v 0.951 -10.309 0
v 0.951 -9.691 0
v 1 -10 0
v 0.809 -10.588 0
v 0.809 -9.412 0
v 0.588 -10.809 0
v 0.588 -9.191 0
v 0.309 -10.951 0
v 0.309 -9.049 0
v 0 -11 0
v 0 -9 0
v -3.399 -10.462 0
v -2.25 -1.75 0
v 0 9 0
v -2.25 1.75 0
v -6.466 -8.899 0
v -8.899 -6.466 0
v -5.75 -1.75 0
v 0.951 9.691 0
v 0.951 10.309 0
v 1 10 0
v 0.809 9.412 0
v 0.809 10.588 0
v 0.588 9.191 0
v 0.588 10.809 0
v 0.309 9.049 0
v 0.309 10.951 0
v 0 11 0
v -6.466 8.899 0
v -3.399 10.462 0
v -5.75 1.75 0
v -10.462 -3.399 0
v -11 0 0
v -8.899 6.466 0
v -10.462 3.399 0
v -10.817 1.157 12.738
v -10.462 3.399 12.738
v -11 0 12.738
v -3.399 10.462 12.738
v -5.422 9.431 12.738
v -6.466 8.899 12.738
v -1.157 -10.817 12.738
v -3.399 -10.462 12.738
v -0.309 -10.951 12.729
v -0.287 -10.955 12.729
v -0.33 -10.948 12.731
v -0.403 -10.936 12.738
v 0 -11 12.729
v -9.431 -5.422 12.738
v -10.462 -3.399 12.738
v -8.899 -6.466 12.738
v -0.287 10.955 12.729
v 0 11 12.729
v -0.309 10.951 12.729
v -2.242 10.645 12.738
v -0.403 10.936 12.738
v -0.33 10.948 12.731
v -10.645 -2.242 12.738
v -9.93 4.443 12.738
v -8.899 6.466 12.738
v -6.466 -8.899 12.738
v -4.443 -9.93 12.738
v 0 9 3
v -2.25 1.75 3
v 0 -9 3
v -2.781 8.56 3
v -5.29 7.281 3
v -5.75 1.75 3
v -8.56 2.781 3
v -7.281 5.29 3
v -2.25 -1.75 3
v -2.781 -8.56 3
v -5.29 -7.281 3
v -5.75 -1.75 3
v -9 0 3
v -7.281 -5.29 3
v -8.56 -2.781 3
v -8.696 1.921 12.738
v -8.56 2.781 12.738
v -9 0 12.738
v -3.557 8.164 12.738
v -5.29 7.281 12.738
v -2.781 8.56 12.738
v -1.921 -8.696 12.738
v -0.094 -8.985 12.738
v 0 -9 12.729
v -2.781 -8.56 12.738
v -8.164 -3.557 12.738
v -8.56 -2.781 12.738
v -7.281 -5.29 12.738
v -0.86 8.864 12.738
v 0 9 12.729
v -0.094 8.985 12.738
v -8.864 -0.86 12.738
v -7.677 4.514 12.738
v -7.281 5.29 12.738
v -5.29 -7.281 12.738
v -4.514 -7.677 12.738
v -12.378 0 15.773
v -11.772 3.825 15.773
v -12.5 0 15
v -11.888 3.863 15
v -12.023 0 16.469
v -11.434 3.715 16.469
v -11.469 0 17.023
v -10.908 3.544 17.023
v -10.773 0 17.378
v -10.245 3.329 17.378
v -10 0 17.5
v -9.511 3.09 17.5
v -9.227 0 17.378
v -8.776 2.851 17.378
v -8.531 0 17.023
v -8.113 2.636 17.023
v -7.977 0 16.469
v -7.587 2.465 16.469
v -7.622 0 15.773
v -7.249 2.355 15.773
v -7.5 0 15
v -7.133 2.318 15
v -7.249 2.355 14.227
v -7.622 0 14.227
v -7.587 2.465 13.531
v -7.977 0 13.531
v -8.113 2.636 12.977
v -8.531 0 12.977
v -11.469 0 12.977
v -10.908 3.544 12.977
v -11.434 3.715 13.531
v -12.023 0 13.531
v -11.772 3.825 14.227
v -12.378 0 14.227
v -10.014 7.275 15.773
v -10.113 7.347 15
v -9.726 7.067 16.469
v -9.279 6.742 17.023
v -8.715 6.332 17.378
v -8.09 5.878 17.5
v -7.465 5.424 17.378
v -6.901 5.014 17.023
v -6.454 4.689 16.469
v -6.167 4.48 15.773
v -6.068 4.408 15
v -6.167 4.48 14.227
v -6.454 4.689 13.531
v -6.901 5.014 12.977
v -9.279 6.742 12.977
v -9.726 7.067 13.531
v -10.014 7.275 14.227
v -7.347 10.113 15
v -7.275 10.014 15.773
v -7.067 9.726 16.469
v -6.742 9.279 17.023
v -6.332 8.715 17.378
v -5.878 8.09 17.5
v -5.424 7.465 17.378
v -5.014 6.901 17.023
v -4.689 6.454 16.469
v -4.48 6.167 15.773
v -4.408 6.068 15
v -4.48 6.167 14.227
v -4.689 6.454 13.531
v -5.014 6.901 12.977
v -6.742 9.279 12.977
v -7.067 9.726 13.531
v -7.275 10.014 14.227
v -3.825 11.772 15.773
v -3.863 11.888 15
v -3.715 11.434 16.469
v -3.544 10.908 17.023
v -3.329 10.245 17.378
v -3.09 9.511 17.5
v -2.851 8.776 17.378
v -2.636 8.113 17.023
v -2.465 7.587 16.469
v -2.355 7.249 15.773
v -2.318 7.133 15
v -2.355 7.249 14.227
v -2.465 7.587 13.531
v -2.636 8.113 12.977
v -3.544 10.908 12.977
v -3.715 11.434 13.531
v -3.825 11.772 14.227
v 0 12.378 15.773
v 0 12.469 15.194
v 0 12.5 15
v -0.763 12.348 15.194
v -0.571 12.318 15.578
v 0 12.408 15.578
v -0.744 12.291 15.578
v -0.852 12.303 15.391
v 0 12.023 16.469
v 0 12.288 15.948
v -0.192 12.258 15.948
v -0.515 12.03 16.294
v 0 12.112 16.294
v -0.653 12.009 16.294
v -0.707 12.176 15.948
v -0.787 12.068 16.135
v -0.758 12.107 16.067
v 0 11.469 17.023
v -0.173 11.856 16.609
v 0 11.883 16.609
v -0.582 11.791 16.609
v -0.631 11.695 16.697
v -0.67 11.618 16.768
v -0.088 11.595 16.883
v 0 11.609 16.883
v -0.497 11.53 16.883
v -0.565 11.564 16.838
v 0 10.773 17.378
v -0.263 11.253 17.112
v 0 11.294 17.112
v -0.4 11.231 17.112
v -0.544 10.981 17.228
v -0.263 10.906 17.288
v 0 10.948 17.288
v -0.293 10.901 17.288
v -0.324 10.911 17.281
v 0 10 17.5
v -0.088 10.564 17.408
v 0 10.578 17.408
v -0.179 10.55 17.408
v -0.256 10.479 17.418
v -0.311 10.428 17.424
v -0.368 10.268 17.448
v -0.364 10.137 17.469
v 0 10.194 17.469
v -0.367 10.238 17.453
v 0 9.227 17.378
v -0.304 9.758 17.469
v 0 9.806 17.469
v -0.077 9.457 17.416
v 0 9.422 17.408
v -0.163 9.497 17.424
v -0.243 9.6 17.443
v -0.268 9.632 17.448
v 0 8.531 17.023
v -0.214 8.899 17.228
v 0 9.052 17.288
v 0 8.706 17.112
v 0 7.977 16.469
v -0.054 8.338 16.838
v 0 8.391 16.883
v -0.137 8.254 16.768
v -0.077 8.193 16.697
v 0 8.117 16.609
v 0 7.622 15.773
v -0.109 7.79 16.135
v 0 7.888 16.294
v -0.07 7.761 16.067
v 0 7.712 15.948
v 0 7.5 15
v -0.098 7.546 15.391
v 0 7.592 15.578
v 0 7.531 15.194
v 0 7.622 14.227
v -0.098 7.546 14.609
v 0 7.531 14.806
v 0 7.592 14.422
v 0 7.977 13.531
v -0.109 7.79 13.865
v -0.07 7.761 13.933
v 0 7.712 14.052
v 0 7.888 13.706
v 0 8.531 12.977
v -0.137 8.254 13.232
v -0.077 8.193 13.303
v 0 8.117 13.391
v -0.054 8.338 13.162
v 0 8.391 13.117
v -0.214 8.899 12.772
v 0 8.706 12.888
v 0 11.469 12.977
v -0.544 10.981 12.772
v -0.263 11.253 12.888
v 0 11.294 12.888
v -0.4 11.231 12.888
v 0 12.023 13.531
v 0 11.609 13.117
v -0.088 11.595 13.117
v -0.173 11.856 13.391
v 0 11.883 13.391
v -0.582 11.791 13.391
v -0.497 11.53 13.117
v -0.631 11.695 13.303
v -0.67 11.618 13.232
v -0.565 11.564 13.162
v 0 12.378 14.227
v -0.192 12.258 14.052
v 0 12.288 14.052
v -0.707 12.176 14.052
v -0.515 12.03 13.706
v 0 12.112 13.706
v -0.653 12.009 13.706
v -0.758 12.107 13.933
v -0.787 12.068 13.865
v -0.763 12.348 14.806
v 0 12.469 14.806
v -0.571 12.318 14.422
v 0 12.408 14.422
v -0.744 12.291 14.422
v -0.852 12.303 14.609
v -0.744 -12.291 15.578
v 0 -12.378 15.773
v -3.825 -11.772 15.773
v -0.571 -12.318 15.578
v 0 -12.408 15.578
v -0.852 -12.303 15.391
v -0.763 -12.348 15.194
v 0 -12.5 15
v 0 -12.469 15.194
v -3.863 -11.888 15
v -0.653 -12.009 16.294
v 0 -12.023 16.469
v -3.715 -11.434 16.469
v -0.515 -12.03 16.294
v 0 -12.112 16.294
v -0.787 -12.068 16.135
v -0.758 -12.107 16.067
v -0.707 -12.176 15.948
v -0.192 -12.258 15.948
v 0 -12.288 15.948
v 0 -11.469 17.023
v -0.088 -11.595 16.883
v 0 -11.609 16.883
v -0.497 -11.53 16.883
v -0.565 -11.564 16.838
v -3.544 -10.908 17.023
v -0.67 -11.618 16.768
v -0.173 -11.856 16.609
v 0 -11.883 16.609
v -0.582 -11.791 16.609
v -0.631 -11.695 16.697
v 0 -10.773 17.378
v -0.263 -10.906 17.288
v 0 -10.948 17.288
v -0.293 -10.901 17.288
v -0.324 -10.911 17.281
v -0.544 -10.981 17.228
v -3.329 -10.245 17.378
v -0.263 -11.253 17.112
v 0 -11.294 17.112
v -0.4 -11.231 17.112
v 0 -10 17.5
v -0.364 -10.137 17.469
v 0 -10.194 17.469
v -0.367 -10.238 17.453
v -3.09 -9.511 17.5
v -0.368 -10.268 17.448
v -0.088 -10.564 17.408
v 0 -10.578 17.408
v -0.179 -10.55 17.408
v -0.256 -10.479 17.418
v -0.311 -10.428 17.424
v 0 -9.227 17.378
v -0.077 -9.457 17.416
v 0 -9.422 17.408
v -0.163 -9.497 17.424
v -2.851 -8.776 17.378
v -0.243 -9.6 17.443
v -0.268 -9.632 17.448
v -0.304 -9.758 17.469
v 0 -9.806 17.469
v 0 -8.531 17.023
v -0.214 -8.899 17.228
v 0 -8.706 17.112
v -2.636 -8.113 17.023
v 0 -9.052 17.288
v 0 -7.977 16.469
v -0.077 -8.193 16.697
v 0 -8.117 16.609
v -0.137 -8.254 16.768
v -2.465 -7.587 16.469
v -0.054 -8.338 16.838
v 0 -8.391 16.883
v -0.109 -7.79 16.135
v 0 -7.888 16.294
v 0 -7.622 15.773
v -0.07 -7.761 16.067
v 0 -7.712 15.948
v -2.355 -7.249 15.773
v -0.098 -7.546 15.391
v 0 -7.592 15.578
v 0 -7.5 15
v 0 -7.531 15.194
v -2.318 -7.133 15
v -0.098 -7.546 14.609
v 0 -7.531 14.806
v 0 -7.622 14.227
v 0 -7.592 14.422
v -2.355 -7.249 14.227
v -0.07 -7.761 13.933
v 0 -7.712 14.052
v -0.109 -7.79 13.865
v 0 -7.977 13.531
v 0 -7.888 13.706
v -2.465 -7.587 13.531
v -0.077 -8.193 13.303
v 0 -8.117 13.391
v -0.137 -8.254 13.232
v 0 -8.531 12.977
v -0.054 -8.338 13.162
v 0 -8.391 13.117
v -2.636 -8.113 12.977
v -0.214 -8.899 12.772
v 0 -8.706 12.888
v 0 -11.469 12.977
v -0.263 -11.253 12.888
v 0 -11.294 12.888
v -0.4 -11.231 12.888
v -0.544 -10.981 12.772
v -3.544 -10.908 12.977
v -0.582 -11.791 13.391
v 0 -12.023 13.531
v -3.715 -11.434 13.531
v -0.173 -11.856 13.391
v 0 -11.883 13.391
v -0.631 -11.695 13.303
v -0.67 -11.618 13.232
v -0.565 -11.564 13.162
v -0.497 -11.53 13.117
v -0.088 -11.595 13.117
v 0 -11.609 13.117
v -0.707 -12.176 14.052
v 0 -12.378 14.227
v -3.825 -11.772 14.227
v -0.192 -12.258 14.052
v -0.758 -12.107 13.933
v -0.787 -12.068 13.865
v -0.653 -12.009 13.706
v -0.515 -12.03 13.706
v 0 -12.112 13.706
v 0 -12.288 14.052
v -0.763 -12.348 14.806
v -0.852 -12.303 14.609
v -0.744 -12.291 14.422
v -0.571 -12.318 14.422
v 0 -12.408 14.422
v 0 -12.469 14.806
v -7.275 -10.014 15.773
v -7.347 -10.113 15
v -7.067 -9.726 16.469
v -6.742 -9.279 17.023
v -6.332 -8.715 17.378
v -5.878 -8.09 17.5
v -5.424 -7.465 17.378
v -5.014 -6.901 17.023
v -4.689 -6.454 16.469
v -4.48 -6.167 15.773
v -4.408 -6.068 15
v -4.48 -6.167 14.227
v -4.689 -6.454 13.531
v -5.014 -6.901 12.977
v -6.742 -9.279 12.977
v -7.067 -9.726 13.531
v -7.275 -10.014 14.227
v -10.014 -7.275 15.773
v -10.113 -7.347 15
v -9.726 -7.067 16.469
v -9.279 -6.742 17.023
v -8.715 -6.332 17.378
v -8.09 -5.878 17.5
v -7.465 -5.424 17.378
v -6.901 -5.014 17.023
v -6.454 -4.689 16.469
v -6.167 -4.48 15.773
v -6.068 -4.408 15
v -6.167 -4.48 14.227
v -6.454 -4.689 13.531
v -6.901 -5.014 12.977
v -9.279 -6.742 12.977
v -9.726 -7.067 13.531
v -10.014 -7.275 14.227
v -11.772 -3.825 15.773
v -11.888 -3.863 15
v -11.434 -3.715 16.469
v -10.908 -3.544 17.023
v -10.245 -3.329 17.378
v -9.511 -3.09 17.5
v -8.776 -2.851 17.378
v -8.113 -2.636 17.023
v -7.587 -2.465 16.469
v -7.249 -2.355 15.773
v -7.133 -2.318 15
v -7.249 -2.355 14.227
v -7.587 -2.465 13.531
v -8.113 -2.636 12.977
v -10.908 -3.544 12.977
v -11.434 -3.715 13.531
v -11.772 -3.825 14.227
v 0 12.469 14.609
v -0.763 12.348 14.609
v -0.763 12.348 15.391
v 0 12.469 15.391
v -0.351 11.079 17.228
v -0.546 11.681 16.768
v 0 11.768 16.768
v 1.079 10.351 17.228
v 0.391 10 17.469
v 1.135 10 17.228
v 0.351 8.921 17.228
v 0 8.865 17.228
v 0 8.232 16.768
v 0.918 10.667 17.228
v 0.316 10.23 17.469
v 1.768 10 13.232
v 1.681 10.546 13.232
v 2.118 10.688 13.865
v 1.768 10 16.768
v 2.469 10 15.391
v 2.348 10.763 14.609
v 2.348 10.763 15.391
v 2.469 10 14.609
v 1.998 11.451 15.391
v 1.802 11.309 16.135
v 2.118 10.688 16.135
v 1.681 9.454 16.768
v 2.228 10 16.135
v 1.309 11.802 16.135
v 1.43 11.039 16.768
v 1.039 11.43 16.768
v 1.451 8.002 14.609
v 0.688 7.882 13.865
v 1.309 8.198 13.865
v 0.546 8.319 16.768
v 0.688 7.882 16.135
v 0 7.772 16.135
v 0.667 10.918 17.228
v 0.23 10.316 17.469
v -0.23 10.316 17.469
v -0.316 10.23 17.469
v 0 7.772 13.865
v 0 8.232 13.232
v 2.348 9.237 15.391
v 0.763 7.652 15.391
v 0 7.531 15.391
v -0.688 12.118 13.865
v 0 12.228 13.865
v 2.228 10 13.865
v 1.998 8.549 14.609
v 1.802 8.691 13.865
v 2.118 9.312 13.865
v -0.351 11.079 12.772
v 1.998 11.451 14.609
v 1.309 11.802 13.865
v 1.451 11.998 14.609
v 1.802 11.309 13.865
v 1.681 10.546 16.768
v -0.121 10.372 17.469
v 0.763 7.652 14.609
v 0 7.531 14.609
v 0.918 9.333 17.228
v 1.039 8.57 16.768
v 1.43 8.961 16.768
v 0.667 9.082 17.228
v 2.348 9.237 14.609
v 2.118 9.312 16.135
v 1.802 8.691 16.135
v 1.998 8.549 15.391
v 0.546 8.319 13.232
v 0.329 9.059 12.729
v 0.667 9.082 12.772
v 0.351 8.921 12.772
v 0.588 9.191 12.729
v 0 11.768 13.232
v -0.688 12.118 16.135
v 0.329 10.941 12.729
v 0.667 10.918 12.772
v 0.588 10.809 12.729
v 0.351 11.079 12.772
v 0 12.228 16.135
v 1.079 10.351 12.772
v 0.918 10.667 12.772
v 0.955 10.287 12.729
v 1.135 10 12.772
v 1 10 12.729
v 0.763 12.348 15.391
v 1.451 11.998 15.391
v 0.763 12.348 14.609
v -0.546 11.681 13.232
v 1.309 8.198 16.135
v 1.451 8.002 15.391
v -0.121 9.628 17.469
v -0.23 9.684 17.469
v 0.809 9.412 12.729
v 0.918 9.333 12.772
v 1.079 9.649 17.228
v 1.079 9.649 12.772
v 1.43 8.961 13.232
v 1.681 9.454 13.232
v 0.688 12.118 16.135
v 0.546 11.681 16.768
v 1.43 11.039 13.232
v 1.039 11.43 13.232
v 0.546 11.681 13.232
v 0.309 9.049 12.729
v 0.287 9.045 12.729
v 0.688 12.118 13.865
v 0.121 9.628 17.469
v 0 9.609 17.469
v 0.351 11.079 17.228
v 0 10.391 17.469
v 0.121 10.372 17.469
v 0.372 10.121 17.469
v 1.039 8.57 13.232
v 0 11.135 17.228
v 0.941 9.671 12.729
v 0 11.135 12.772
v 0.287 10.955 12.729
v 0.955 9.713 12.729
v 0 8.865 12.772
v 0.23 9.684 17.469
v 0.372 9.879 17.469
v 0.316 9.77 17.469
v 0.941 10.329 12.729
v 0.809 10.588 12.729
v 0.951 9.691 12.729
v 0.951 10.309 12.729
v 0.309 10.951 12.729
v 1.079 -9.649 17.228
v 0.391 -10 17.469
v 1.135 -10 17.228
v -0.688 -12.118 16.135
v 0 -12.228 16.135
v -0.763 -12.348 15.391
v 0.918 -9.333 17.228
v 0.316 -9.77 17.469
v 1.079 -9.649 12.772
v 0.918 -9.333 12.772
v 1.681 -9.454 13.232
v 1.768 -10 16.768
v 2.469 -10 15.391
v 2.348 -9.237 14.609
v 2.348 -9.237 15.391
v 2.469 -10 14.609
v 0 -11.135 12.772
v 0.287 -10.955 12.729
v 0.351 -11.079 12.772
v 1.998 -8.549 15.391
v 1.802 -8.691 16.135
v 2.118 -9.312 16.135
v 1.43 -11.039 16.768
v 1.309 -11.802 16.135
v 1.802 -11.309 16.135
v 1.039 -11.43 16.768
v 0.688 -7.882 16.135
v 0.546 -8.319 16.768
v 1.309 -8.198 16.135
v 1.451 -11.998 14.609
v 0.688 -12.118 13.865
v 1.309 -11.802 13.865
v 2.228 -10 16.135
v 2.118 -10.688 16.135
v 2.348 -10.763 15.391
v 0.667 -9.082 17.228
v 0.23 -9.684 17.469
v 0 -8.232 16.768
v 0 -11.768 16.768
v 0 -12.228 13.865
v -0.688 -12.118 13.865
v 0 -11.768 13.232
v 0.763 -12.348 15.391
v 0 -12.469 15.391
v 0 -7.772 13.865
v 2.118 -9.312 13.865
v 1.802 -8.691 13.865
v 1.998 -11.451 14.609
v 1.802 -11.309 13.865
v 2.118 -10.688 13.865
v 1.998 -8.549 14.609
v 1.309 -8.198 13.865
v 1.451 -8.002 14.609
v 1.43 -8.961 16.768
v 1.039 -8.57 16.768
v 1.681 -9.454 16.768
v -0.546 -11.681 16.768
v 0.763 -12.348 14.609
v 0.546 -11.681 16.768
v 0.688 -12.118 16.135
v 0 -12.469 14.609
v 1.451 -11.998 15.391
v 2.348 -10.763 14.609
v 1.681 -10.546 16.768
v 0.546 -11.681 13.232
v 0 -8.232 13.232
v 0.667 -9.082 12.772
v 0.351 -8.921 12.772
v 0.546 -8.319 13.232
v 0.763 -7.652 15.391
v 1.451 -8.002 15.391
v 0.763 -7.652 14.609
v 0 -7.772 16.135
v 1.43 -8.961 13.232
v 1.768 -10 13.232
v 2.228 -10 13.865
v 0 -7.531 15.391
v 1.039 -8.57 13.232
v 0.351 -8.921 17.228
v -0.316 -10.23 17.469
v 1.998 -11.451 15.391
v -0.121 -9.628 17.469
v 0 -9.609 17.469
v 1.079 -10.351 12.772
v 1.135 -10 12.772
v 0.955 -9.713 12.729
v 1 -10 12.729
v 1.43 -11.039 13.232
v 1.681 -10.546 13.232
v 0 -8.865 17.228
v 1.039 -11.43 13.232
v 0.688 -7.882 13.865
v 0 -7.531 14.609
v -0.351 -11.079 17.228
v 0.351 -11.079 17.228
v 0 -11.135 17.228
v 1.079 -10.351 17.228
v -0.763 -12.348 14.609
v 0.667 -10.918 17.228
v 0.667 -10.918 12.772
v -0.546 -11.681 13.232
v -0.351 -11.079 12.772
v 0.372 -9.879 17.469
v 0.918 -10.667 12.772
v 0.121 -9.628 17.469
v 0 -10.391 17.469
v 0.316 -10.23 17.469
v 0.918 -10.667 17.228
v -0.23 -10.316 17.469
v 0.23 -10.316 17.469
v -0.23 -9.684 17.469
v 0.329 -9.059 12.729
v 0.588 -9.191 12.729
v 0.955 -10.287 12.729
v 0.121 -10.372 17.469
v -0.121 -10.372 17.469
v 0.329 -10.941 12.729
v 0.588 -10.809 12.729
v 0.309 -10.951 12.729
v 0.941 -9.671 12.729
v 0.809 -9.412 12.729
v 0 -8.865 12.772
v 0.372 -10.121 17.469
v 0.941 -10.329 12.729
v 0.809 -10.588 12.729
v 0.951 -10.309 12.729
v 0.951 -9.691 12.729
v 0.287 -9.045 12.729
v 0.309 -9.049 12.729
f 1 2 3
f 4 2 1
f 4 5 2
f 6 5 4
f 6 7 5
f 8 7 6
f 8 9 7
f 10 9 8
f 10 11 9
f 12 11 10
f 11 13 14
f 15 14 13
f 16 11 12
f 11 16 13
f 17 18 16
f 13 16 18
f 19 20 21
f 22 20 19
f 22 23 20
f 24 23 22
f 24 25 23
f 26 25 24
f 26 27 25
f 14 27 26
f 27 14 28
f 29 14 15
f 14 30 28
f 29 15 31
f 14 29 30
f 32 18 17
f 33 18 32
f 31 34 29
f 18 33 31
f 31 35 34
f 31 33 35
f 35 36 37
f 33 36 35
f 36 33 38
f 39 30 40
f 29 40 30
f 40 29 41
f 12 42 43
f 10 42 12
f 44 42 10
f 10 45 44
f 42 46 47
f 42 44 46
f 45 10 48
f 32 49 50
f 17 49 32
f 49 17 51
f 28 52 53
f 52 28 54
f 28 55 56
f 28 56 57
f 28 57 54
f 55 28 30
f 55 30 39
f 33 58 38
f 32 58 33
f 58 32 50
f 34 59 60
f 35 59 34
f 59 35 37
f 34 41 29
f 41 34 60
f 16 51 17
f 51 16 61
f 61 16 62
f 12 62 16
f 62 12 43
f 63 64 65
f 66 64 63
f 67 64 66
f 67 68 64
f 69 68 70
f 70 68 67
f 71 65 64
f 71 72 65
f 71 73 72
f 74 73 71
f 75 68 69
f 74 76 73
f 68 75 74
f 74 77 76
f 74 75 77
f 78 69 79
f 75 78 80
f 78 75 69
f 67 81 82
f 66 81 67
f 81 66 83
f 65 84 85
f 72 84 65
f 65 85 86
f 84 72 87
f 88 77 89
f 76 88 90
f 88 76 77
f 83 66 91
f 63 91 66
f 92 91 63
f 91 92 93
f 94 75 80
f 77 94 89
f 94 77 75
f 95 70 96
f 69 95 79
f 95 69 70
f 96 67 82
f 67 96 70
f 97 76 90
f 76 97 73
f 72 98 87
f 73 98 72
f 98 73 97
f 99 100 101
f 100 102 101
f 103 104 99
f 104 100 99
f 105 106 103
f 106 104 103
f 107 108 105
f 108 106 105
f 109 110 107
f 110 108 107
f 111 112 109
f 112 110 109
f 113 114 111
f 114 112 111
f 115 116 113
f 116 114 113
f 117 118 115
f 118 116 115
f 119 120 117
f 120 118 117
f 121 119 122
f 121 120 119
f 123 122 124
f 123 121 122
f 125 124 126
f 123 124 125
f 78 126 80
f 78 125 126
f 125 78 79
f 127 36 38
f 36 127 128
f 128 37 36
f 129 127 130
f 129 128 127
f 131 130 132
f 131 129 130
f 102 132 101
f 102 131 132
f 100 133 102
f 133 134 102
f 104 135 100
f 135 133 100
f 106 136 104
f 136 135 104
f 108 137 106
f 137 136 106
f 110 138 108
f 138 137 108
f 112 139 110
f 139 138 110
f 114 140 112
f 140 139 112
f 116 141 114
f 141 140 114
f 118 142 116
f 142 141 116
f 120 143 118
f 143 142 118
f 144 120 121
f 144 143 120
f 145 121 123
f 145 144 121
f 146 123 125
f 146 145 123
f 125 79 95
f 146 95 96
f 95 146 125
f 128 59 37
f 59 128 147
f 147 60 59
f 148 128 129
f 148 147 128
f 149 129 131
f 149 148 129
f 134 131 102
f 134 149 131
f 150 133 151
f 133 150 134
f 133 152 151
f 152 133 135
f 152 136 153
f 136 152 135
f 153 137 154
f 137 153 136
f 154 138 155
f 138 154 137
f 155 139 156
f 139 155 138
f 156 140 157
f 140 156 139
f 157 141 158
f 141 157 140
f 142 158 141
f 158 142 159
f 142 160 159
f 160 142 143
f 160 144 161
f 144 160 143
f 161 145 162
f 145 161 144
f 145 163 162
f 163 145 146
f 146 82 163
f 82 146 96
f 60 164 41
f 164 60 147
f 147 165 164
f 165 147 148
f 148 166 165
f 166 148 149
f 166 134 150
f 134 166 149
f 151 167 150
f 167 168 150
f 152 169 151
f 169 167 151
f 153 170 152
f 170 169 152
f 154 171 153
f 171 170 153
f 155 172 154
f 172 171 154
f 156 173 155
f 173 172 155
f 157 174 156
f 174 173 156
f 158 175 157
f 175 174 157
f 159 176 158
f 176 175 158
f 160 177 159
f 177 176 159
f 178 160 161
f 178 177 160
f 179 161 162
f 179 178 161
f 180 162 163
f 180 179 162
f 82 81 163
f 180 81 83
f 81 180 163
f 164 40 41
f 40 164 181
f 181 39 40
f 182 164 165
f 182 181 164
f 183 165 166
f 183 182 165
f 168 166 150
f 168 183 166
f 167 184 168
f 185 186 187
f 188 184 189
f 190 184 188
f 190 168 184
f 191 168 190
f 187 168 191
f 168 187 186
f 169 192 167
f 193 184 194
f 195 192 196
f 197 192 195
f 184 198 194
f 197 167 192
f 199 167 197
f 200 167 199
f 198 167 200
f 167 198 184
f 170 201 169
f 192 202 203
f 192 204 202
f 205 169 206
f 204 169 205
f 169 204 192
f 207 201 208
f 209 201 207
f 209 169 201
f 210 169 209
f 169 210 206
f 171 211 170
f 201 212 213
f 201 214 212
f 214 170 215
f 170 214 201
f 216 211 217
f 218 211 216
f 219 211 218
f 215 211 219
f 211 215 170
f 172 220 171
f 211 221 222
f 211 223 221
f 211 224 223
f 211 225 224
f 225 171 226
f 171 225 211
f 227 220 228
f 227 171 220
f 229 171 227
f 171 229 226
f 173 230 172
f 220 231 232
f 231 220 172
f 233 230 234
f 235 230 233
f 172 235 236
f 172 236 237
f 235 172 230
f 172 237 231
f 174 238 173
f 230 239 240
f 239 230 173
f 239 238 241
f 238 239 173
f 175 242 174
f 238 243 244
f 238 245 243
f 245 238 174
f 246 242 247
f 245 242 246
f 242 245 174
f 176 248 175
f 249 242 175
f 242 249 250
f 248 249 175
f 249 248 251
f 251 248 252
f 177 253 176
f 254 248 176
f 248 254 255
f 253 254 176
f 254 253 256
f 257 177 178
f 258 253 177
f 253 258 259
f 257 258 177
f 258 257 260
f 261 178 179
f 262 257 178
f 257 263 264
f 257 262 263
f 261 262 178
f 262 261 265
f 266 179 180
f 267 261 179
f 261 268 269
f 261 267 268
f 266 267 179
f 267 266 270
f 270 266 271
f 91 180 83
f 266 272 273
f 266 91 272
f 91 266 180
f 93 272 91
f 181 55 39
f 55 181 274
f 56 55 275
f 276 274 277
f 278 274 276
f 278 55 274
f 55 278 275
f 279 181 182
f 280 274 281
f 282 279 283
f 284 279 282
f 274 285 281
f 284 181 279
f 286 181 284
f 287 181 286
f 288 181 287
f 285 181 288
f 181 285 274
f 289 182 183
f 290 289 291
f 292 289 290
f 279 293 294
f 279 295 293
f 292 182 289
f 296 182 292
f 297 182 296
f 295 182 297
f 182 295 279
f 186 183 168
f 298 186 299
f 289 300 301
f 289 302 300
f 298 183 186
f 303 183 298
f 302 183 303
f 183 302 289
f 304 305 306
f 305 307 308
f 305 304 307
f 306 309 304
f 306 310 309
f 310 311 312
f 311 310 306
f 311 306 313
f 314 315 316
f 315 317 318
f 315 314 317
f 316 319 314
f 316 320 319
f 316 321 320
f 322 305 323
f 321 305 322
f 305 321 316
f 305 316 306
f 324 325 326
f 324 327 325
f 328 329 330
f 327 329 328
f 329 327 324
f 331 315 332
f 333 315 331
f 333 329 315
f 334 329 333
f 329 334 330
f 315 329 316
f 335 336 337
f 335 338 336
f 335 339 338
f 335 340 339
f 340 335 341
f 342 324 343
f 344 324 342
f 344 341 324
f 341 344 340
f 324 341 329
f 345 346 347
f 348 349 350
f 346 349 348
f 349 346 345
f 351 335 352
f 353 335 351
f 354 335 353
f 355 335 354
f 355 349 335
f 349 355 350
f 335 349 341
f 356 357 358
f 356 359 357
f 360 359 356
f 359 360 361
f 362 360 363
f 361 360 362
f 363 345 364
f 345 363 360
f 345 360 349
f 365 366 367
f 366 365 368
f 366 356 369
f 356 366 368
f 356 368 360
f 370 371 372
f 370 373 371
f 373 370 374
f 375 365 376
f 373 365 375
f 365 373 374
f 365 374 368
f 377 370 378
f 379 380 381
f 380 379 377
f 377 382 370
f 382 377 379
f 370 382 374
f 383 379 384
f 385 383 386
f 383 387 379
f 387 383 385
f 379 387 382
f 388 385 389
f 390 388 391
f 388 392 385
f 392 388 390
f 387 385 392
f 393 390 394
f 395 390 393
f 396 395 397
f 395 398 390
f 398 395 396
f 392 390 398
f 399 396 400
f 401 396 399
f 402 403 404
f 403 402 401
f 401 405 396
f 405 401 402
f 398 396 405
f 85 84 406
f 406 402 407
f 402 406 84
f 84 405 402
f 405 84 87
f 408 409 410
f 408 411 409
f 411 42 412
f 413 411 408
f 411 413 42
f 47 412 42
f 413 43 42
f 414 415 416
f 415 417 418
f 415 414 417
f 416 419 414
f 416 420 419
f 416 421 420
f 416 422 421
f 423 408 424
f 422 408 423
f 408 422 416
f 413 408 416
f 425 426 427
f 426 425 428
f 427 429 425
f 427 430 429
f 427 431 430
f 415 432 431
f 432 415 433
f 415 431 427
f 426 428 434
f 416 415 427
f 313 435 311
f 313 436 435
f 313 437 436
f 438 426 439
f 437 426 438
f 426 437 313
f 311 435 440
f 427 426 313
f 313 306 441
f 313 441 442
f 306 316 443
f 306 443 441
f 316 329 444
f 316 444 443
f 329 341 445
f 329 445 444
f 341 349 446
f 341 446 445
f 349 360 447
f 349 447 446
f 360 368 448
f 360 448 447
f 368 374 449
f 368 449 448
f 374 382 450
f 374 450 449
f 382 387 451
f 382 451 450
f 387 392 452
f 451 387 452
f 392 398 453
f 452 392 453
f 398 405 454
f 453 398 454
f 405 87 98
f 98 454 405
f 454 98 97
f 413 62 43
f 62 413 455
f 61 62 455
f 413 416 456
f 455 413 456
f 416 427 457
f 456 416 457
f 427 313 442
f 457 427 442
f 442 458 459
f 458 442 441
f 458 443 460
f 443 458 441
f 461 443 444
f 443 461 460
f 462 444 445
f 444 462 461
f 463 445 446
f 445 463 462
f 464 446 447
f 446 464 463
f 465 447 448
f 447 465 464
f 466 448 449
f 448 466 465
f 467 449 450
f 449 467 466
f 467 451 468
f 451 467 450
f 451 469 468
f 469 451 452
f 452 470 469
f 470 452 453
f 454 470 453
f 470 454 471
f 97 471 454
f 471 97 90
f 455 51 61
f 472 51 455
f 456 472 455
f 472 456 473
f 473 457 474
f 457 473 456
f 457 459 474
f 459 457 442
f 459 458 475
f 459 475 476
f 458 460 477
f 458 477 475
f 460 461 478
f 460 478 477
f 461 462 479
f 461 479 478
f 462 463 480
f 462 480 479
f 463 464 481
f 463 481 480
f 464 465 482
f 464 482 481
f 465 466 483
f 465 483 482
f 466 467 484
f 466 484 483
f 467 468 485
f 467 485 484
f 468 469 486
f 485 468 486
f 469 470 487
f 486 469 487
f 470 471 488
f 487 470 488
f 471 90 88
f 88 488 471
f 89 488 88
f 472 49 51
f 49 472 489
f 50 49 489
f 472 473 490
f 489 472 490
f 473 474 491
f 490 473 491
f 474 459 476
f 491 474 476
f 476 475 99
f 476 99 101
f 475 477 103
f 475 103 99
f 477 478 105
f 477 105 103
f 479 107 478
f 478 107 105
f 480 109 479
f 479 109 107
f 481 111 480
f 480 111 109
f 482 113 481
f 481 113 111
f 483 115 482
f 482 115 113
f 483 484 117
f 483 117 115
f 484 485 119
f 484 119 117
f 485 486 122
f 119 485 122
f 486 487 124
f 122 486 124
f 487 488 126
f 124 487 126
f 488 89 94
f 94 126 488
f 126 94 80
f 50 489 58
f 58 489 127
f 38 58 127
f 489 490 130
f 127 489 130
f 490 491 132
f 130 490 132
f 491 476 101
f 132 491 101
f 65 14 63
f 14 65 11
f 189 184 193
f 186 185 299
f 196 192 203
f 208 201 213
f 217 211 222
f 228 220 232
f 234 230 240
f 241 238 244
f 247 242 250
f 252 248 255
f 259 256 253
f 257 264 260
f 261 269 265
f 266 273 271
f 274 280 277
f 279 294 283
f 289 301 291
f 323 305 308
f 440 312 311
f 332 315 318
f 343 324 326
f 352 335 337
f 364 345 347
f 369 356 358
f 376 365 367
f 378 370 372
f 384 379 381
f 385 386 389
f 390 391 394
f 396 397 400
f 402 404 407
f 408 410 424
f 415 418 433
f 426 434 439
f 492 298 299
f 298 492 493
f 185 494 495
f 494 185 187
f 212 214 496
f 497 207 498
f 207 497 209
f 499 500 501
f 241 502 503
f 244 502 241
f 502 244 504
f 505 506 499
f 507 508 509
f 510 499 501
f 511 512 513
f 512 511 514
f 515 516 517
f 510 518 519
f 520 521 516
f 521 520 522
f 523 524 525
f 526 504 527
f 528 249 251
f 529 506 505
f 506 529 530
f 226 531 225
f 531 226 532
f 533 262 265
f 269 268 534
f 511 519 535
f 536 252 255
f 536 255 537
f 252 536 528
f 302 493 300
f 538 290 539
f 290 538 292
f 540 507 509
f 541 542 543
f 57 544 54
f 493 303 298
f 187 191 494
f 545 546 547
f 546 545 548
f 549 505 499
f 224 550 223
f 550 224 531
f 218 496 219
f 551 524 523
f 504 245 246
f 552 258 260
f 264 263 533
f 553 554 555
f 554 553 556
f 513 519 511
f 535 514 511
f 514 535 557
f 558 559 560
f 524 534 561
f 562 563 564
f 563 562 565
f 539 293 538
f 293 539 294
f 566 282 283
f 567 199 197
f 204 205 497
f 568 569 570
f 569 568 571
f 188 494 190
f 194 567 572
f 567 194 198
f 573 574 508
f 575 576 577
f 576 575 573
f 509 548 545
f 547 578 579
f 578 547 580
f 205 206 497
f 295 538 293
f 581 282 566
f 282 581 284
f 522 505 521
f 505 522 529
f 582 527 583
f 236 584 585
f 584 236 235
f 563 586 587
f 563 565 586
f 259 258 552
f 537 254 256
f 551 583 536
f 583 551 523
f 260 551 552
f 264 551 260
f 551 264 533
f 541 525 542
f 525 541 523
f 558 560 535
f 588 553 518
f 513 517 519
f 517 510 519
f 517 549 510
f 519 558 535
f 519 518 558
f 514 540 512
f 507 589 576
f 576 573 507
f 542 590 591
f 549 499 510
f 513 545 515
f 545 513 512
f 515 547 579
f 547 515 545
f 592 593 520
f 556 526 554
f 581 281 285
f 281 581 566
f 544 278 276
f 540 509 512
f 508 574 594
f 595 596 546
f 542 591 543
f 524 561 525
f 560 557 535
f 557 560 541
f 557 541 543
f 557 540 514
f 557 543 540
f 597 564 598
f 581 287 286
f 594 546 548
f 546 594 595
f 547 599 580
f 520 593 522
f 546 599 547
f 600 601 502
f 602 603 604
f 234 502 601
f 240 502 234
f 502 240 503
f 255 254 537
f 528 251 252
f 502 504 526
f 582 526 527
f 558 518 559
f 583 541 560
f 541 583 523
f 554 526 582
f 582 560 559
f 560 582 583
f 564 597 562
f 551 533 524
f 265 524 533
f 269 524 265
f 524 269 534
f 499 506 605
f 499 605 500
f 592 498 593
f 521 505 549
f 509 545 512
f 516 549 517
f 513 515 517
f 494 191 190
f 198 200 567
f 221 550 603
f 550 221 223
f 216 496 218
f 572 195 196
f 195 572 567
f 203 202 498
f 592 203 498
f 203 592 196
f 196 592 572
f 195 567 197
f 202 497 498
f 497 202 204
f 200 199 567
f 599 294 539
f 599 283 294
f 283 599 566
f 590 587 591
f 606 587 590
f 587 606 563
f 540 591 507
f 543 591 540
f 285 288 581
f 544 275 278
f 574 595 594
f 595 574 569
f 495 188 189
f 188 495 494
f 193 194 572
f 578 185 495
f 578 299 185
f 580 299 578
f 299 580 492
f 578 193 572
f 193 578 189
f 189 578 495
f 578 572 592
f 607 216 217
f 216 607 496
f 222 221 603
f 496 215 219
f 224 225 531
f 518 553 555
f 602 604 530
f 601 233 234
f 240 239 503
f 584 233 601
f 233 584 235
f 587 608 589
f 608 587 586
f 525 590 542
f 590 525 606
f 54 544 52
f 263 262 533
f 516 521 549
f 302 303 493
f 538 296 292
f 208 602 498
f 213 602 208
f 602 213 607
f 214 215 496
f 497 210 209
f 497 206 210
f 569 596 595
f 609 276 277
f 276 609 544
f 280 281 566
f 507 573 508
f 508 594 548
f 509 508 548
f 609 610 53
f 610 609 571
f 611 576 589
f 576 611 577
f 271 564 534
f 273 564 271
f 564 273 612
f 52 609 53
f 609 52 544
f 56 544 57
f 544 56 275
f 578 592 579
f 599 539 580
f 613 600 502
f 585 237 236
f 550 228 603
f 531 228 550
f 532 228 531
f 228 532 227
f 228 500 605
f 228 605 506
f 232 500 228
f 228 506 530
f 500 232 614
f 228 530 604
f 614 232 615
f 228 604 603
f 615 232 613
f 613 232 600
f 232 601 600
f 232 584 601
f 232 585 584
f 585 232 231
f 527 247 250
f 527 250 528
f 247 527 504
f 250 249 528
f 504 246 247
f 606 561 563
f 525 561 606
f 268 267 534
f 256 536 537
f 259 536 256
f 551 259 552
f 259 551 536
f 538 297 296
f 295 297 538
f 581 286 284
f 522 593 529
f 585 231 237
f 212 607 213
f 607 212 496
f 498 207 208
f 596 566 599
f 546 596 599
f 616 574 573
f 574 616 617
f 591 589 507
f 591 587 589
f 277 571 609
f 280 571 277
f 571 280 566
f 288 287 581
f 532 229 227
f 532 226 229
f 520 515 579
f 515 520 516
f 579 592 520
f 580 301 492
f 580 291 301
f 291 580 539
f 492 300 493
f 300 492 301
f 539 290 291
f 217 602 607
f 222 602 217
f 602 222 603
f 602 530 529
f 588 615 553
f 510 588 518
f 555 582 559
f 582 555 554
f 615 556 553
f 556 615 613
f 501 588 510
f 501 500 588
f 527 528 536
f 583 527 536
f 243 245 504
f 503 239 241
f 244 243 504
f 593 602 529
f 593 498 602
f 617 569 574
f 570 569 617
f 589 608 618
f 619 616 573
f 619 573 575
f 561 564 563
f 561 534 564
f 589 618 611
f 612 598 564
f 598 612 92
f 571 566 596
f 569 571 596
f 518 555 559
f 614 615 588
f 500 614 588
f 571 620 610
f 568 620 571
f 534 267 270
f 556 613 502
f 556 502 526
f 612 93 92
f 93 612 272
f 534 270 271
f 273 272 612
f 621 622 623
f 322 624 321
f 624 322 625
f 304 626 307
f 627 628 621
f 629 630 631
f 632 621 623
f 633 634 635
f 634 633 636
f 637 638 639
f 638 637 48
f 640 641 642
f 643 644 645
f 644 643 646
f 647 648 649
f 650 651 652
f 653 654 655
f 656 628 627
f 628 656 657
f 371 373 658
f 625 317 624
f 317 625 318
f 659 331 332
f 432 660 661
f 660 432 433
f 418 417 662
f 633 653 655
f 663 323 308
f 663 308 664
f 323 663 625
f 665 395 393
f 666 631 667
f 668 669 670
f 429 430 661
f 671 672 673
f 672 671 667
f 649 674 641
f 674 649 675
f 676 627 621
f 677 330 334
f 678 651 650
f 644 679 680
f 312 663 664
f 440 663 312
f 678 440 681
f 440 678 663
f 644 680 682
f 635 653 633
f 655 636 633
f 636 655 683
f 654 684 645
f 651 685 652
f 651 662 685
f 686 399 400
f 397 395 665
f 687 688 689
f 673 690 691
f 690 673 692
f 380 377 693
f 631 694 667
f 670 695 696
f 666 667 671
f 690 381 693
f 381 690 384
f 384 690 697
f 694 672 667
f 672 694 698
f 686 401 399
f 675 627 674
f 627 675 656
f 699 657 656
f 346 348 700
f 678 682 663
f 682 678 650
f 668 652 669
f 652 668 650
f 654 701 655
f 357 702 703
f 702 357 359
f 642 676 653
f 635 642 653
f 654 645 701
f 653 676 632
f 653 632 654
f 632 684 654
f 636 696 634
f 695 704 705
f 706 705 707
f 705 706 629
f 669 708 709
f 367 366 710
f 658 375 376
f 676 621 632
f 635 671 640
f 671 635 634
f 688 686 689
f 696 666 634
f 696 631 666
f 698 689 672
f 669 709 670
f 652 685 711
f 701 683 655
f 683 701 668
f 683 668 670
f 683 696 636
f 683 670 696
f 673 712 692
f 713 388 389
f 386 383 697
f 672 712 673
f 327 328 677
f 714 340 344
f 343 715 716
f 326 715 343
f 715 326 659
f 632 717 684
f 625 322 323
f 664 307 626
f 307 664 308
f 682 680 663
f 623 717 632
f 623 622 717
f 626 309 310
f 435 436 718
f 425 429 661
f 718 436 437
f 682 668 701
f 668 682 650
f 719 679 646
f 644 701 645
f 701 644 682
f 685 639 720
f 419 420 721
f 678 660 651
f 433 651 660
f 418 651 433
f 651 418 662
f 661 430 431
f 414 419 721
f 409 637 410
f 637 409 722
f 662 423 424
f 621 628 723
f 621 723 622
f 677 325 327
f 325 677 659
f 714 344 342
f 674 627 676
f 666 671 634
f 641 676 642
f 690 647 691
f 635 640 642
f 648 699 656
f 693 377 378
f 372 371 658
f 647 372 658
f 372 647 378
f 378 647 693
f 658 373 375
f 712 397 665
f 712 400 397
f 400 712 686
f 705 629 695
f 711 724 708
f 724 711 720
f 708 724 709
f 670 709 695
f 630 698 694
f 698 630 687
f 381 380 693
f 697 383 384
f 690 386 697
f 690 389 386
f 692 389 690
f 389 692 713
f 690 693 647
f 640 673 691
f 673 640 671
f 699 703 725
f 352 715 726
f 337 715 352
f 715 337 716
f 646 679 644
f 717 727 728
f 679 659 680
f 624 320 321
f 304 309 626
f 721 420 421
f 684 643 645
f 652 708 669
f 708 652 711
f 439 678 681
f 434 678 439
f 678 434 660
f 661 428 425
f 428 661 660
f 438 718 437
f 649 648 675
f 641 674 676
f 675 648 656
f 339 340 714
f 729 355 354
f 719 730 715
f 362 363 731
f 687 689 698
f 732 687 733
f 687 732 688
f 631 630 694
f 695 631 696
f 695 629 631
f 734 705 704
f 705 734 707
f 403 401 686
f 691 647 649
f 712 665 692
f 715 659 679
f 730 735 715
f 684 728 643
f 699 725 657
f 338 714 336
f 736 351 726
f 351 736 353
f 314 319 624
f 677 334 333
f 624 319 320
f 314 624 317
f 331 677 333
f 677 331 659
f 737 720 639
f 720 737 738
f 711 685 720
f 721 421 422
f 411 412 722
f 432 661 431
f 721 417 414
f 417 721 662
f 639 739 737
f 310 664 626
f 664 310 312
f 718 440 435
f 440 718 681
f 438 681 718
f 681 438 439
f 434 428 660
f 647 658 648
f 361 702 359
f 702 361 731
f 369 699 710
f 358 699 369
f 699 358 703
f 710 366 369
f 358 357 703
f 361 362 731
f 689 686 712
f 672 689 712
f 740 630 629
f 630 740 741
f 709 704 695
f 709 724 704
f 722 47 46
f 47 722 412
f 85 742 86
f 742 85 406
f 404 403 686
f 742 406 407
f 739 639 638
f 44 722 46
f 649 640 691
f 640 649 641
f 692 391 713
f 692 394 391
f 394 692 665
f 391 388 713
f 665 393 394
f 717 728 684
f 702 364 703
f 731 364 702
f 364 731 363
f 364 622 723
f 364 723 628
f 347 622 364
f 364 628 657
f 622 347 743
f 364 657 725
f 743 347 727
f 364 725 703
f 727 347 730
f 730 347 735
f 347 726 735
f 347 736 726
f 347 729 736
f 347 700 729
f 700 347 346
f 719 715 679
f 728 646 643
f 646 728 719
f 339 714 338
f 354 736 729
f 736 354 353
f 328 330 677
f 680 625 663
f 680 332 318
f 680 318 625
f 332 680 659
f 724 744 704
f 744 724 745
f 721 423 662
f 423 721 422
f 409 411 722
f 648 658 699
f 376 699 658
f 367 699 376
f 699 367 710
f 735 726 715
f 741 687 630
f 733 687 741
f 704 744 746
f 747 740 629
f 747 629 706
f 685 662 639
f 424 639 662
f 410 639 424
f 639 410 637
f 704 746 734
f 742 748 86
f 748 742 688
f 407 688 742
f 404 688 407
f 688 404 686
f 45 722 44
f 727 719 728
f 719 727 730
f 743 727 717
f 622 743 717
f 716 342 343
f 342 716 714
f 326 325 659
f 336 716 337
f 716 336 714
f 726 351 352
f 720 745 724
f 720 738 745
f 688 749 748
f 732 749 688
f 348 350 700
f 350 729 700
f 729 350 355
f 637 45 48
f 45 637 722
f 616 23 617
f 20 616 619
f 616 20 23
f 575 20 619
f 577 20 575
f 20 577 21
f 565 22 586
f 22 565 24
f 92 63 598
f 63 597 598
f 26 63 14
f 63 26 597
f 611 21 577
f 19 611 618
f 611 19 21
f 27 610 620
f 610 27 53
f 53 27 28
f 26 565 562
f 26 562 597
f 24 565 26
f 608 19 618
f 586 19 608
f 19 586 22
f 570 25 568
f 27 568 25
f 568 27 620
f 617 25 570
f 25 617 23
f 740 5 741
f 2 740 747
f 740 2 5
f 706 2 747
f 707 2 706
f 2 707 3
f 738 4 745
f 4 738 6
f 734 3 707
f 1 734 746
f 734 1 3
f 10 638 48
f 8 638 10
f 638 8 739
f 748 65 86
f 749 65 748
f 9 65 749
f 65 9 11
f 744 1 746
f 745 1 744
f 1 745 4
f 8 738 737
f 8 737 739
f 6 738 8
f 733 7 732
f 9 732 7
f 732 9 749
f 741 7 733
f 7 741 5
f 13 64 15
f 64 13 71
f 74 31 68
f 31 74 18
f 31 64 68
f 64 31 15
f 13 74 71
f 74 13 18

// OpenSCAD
$fn = 20;

radio1 = 22 / 2;
altura = 15;
grosor = 2;
radio2 = 5 / 2;
ancho_total = 32;

///////////////

desplazamiento_horizontal = ancho_total - radio1 * 2;

difference() {
semianillo(
    radio1, 
    altura, 
    grosor, 
    radio2, 
    0,
    0
);

translate([-radio1/2+1.5, 0, 0]) cube([3.5, 3.5, 10], true);
}

module semianillo(
    radio1, 
    altura,
    grosor,
    radio2,
    translado,
    giro
    ) {
    translate(translado)
        rotate(giro) {
            difference() {
                union() {
                    // Borde del cilindro
                    difference() {
                        cylinder(altura, r = radio1);
                        translate([0, 0, grosor+1]) 
                            cylinder(altura - grosor, r = radio1 - grosor);
                    }

                    // Anillo
                    translate([0, 0, altura])
                    rotate_extrude(convexity=10)
                    translate([radio1 - grosor/2, 0, 0])
                    circle(radio2);
                }

                // Cubo que se le quita para quedarse con la mitad
                translate([0, - radio1 - radio2, 0])
                cube([radio1 + radio2, 2 * (radio1 + radio2), altura + radio2]);
            }
            
            translate([0, radio1 - grosor/2, altura])
                sphere(r = radio2);
            
            translate([0, -(radio1 - grosor/2), altura])
                sphere(r = radio2);
            
            translate([0, radio1 - grosor/2, 0])
                cylinder(altura, r = grosor/2);

            translate([0, -(radio1 - grosor/2), 0])
                cylinder(altura, r = grosor/2);
        }
            
     
}
